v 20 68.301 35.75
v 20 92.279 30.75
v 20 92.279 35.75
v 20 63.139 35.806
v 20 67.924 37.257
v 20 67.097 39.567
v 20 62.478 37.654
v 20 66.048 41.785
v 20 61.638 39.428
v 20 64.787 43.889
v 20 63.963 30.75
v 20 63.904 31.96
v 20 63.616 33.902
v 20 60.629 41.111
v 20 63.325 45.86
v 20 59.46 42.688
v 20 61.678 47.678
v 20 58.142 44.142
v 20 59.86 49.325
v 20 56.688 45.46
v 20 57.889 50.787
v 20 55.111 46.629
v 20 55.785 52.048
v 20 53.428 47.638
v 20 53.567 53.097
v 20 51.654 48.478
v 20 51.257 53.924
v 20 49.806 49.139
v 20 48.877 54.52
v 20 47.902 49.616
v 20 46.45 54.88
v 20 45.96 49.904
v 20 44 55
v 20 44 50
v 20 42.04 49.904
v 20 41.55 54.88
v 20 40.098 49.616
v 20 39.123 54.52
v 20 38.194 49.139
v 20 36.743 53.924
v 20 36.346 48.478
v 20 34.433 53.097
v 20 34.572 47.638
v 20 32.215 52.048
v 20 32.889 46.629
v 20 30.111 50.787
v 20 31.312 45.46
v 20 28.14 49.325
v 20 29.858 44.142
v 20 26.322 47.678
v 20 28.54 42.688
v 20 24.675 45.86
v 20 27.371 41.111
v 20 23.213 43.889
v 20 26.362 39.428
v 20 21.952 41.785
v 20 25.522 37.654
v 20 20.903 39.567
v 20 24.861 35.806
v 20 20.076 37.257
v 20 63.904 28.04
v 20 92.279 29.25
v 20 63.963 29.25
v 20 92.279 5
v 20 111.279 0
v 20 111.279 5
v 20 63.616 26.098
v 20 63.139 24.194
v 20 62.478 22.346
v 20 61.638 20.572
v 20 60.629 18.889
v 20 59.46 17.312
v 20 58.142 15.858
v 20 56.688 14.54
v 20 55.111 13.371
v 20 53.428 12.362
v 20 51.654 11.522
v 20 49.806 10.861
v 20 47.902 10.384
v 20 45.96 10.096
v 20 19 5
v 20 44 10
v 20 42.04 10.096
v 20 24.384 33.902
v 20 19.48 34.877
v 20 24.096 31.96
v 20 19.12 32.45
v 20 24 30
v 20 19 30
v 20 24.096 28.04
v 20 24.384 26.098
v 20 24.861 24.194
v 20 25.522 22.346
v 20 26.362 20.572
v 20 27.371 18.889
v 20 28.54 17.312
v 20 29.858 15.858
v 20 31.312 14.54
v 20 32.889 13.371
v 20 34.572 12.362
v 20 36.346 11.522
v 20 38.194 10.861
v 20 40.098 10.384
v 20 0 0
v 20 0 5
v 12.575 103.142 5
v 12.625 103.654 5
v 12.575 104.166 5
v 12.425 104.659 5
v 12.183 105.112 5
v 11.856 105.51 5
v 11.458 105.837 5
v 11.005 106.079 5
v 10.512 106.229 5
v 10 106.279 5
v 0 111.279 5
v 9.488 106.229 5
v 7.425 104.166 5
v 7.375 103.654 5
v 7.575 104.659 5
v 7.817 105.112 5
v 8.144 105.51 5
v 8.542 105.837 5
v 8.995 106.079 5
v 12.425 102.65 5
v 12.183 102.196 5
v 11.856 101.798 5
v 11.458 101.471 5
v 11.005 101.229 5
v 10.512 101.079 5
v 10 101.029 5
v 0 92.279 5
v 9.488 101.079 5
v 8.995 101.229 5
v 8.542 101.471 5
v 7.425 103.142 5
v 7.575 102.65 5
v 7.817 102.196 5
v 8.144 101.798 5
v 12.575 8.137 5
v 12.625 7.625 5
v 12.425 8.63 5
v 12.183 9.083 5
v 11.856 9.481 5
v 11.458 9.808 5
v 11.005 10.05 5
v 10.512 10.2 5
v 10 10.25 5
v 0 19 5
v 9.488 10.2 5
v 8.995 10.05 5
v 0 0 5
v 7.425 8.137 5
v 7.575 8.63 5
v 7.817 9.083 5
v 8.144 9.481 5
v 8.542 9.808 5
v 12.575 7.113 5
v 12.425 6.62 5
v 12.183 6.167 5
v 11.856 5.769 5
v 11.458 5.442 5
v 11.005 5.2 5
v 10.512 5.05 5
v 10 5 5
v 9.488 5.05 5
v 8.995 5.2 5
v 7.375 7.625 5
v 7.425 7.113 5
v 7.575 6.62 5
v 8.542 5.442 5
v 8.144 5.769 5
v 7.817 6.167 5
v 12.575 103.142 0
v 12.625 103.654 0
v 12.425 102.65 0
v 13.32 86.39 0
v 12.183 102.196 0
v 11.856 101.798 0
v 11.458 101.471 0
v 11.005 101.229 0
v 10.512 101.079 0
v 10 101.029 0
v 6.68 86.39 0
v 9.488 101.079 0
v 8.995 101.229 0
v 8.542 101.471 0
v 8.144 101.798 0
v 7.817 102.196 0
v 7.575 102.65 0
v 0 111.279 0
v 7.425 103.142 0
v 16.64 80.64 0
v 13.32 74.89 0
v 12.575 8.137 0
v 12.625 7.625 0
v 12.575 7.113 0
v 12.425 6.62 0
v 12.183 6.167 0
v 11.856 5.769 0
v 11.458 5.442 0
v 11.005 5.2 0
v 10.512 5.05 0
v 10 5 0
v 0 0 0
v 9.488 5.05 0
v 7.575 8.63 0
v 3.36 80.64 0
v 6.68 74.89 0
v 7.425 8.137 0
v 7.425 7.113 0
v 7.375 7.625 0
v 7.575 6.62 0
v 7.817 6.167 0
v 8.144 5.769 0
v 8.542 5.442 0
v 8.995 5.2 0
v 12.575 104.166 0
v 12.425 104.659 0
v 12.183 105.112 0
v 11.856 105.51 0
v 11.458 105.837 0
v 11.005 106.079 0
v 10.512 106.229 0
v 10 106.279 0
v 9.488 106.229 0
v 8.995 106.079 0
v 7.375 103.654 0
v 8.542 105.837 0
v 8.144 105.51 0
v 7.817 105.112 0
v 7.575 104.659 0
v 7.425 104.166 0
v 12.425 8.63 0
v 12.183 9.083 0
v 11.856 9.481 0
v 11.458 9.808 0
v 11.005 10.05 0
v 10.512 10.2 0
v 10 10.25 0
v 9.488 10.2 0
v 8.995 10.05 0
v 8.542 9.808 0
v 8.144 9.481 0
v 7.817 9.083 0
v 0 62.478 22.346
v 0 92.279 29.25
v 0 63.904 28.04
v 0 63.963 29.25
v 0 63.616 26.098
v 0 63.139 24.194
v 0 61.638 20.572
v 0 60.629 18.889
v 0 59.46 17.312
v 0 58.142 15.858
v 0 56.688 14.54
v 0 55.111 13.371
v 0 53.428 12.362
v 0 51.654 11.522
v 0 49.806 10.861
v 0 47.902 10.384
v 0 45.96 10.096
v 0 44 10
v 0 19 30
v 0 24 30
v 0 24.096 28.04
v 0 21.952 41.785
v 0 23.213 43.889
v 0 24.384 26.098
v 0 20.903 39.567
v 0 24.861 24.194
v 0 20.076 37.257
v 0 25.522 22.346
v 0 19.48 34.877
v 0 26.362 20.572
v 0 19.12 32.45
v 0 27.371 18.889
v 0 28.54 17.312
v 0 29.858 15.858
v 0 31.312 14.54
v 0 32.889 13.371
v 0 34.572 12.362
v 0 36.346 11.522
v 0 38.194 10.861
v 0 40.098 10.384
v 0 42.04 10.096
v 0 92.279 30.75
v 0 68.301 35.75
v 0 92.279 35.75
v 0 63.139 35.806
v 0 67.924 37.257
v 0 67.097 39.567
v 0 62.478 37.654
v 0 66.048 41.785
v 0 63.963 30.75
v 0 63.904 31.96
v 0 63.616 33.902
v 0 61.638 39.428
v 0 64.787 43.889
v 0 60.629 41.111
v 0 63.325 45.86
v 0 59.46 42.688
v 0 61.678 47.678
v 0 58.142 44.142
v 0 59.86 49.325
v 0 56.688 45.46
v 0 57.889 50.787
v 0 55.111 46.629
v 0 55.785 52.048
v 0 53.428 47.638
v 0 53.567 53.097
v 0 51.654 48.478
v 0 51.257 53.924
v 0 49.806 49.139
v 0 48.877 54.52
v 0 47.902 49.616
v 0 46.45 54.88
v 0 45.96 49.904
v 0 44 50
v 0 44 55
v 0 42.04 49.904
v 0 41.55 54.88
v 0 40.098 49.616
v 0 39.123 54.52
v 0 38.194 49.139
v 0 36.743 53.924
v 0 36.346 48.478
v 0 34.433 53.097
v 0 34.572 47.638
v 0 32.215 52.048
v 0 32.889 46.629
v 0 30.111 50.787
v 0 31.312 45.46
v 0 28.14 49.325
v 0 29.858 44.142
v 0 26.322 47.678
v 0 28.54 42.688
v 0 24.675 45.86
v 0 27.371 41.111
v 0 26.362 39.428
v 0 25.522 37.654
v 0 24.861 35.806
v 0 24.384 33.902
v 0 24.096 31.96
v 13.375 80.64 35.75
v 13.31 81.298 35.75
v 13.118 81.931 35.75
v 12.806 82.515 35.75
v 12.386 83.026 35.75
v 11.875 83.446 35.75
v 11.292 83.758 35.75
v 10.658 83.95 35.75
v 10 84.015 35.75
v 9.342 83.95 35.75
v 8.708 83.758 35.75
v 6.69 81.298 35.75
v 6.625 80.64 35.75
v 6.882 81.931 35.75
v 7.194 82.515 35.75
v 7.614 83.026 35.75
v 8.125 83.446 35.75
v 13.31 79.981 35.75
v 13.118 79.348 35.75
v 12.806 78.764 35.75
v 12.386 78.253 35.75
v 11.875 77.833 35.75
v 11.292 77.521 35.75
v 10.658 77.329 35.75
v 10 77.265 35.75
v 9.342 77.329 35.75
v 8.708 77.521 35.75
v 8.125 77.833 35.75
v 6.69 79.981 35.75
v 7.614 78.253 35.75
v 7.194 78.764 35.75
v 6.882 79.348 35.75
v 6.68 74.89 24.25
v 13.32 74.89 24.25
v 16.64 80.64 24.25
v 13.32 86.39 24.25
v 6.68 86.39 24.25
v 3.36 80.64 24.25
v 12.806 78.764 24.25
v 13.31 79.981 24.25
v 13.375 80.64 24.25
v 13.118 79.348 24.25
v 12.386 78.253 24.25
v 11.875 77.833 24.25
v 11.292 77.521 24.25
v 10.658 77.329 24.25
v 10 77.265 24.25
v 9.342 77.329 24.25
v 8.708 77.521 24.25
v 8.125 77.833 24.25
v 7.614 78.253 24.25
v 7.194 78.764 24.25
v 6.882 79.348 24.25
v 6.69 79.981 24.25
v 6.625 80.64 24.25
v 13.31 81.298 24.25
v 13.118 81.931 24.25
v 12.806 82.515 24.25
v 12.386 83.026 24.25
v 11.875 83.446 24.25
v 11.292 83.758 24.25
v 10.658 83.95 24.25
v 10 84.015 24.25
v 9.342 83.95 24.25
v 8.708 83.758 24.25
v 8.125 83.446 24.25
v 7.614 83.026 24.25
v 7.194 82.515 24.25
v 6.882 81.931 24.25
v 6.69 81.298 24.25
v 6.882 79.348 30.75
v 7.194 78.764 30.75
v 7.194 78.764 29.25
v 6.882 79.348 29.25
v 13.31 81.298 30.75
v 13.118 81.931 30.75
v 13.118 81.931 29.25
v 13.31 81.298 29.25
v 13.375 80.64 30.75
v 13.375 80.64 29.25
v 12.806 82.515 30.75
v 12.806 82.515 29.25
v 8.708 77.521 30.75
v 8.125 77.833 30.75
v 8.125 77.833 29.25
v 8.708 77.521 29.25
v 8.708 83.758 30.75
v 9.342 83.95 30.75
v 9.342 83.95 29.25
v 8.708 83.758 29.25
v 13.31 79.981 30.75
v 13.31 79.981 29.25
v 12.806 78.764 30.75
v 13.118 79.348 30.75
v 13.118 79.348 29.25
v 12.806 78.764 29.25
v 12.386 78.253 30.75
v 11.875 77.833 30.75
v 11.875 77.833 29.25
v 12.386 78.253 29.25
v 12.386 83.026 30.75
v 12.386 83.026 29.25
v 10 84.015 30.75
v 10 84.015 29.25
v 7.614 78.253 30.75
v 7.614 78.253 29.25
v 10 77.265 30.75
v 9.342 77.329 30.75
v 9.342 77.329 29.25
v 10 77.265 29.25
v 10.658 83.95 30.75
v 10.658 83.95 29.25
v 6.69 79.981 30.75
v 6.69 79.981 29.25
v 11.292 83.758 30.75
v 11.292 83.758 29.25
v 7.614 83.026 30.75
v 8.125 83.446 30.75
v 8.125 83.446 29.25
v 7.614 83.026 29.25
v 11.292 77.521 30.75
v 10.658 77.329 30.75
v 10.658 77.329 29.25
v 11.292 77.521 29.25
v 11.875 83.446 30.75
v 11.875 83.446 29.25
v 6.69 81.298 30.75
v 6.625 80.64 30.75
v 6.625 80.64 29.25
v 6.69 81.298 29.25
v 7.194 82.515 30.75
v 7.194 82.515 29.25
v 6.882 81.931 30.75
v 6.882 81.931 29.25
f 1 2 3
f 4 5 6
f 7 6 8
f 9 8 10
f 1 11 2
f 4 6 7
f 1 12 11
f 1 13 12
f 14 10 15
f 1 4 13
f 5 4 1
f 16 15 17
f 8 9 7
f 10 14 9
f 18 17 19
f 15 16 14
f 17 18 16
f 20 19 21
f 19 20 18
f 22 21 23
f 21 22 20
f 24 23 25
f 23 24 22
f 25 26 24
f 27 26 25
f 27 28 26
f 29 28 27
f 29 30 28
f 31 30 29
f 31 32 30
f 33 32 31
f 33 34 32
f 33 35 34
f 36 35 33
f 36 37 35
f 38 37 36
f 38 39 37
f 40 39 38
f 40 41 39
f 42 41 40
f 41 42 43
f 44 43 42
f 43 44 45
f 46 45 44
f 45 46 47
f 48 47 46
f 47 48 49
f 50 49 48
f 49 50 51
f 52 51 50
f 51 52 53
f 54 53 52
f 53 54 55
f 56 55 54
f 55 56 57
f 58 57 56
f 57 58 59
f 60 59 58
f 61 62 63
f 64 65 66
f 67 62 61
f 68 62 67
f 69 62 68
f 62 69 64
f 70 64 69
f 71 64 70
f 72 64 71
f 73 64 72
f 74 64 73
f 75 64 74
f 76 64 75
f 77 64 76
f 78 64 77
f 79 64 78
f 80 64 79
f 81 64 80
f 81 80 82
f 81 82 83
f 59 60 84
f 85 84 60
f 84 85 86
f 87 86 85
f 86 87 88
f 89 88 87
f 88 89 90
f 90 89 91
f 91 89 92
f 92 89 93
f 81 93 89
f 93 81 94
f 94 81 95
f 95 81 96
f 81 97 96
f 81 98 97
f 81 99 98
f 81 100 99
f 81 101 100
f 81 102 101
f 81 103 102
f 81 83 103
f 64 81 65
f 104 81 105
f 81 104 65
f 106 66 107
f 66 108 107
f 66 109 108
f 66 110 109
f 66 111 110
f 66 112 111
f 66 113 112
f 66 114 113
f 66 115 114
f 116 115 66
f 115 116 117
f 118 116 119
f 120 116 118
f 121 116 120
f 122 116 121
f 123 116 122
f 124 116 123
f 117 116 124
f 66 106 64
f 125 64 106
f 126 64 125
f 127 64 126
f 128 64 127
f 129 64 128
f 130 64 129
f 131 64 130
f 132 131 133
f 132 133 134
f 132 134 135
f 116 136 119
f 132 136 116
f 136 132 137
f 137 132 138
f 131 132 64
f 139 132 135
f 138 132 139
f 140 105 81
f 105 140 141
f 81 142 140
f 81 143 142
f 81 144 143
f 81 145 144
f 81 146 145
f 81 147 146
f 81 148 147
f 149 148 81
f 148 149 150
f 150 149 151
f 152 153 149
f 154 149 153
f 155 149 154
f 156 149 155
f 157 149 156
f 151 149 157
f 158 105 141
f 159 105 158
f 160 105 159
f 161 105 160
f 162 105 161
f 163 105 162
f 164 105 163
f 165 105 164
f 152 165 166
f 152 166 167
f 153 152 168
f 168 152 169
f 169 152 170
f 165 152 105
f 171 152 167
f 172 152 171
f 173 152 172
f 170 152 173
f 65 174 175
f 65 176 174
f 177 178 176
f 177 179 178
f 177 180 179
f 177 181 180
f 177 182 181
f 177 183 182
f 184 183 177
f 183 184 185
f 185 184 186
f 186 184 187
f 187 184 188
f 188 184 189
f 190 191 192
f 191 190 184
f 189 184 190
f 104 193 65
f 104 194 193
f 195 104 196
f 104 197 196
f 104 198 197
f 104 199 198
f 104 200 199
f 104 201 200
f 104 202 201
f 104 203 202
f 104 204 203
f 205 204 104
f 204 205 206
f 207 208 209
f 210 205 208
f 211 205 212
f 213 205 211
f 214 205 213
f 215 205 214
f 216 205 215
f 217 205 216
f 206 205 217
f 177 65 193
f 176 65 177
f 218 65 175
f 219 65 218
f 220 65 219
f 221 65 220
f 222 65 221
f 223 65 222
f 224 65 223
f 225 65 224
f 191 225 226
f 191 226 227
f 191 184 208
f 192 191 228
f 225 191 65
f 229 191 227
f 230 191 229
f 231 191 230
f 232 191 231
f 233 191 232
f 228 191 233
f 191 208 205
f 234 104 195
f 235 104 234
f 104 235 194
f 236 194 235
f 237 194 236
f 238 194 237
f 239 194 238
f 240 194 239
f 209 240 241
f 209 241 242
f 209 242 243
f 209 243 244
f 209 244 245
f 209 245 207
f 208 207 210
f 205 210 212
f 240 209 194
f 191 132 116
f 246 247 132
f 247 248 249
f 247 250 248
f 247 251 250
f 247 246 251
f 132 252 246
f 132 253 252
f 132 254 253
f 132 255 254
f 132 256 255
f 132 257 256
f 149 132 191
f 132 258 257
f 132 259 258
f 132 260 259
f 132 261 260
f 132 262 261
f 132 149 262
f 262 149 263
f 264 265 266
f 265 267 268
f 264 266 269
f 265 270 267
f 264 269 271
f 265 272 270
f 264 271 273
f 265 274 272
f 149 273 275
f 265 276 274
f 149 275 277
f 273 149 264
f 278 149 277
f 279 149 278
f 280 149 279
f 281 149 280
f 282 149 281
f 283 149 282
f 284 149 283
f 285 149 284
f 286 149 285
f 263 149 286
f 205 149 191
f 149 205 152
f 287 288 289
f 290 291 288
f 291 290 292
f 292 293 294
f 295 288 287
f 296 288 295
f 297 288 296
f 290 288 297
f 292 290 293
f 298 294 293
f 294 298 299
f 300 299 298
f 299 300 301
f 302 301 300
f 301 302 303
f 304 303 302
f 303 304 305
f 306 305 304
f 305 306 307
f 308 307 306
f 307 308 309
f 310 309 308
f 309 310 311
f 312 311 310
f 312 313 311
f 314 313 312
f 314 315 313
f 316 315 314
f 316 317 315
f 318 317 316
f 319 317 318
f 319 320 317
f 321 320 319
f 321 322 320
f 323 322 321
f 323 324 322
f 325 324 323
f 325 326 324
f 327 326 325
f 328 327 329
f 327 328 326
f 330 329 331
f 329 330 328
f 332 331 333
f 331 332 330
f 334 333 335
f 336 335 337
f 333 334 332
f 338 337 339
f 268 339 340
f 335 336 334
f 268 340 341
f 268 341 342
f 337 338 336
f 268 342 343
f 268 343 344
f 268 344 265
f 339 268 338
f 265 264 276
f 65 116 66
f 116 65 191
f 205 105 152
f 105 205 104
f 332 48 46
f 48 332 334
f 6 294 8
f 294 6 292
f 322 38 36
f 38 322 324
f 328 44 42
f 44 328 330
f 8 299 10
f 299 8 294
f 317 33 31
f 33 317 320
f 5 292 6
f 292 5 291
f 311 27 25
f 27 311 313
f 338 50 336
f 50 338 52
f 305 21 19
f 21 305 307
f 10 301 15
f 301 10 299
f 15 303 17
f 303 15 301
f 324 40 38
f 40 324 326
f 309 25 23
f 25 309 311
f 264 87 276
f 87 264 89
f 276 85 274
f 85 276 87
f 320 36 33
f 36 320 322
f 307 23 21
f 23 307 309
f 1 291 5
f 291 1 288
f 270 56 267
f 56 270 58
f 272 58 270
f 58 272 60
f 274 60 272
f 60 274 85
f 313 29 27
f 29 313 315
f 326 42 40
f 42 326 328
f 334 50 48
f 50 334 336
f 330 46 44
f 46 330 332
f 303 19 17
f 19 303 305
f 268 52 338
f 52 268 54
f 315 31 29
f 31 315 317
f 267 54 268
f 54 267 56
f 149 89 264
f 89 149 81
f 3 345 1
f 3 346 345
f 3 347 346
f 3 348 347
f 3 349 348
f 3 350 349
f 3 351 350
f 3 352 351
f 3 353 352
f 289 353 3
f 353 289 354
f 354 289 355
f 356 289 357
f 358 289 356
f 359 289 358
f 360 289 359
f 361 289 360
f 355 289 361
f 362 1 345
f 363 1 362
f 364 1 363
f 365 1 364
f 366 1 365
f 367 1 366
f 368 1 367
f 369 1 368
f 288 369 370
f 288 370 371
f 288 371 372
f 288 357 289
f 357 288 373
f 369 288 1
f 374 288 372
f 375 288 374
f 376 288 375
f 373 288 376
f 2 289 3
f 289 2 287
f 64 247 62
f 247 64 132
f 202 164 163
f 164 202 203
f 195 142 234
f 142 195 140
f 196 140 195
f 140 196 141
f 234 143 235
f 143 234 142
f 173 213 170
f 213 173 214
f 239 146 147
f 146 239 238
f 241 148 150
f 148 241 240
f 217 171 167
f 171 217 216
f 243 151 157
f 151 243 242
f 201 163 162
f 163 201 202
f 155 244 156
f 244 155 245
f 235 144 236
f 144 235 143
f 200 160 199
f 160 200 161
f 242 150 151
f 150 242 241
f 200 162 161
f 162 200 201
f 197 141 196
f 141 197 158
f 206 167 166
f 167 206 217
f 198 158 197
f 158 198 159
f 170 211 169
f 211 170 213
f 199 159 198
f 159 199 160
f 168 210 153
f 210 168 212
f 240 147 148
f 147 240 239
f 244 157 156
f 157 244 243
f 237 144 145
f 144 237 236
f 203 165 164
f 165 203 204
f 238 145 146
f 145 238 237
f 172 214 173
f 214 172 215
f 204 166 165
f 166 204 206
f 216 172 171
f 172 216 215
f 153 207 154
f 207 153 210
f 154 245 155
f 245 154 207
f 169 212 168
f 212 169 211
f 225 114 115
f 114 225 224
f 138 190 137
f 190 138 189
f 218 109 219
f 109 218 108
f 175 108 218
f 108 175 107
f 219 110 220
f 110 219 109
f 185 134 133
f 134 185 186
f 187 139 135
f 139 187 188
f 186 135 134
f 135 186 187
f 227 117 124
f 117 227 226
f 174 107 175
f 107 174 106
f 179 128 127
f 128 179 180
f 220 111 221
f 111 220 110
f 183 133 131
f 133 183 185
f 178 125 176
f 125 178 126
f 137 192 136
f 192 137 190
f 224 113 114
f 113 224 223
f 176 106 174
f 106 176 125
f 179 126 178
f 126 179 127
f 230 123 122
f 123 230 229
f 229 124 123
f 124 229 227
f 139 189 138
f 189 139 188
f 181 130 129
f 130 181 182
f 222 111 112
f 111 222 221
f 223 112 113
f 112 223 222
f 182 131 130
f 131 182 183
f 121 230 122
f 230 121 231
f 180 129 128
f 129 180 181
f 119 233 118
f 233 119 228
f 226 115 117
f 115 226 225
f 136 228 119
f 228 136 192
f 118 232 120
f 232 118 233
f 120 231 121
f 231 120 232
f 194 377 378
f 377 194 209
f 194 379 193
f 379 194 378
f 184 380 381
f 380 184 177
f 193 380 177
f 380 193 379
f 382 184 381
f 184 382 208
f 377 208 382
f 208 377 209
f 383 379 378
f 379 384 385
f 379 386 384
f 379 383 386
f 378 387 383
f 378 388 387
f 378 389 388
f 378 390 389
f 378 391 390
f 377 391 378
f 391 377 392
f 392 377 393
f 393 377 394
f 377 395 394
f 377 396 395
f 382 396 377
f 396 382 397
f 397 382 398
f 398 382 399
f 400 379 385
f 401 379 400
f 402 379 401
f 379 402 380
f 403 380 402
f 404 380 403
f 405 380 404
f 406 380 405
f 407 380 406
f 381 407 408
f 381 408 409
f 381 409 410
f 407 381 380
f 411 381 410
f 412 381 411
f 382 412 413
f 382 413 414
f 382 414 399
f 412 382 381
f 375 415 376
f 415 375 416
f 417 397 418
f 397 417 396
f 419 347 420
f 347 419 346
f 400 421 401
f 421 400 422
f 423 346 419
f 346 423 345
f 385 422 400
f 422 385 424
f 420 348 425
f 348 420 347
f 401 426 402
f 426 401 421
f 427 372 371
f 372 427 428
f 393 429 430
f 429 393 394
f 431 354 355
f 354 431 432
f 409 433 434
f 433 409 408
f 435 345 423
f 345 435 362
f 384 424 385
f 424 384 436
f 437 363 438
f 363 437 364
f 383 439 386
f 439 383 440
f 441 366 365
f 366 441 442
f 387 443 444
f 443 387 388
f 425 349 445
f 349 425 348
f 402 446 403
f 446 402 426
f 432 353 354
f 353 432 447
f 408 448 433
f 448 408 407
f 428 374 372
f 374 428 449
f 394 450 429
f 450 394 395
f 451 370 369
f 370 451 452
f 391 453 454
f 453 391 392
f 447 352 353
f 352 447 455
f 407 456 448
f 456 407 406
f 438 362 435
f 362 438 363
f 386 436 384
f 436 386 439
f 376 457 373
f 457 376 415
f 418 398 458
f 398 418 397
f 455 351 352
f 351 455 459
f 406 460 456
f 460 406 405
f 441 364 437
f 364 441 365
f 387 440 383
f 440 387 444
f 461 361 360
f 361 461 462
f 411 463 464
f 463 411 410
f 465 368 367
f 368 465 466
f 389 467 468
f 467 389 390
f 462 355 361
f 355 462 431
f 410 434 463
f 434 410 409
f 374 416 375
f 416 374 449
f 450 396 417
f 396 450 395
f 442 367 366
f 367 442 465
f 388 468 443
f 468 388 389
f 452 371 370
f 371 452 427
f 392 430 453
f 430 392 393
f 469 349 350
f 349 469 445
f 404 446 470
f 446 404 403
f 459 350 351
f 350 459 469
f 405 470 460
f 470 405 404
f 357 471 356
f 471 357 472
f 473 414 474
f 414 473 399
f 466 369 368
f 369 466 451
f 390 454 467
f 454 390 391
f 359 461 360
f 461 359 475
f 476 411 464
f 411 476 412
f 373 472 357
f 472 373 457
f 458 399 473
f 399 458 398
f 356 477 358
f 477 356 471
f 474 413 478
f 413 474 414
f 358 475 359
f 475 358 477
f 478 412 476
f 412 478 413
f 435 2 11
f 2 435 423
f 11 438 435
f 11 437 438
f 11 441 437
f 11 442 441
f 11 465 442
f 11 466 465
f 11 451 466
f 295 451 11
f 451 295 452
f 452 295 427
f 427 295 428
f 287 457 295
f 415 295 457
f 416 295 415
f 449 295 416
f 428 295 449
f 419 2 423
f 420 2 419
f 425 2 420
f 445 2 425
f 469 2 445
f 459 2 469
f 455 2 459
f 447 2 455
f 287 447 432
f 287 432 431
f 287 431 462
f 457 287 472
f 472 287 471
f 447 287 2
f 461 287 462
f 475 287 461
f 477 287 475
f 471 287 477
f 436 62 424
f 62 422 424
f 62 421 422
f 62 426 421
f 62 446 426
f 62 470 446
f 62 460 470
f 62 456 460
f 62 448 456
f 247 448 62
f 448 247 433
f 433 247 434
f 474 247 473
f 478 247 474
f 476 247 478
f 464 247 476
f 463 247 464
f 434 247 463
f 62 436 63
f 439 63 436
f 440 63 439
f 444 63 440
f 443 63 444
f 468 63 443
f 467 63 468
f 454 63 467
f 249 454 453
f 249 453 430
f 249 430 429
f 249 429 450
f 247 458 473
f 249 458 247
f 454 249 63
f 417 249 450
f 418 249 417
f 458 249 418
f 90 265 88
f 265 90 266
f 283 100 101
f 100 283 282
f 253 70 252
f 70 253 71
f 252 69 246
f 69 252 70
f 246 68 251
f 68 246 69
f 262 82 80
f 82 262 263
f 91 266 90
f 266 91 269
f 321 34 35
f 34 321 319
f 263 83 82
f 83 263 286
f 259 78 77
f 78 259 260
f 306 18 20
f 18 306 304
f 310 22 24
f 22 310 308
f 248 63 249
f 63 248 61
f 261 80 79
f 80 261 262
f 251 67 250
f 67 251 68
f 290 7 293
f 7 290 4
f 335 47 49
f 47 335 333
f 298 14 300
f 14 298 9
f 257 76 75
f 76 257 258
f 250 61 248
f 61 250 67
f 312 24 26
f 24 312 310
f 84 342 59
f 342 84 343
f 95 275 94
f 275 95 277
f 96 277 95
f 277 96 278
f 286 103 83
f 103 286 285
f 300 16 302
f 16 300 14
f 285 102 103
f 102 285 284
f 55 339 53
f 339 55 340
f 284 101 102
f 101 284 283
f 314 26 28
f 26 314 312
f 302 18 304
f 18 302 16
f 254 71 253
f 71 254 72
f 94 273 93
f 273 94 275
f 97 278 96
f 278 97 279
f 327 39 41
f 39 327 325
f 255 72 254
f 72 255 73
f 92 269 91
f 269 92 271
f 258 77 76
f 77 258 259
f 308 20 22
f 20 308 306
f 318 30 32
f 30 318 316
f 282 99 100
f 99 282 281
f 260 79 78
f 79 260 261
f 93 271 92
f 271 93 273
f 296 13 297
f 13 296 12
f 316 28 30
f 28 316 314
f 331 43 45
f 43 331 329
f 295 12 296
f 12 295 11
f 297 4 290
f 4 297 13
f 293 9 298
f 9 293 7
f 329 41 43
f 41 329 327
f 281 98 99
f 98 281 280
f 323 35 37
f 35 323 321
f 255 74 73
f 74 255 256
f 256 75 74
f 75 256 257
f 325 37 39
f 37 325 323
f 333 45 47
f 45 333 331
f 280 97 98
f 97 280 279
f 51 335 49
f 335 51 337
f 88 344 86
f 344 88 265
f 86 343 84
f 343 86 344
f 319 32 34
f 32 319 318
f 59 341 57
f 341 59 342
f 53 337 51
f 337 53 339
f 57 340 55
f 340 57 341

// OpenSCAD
min_T = 5;

motor_D = 40;
motor_offset = 30;

gap_T = 1.5;

bolt1_D = 5.25;
bolt1_HD = 9;

bolt2_D = 6.75;
bolt2_HW = 11.5;
bolt2_HD = 2*bolt2_HW/sqrt(3);

mount_T = 20;
mount_L = 2*bolt1_HD + bolt2_HD + 8*min_T + motor_D;

difference(){
union(){
  cube([mount_T, mount_L, min_T]);

  translate([0, motor_D/2 +min_T + bolt1_HD + 2*min_T, motor_offset])
  rotate([0, 90, 0])
  cylinder(d = motor_D + 2*min_T, h = mount_T, $fn = 64);

  translate([0, bolt1_HD + 2*min_T, 0])
  cube([mount_T, motor_D/2 + min_T, motor_offset]);

  translate([0, motor_D/2 + 3*min_T + bolt1_HD, 0])
  cube([mount_T, motor_D/2 + 3*min_T + bolt2_HD, motor_offset + gap_T/2 + min_T]);
}

translate([mount_T/2, min_T + bolt1_D/2, -0.1])
cylinder(d = bolt1_D, h = min_T + 0.2, $fn = 32);

translate([mount_T/2, mount_L - min_T - bolt1_D/2, -0.1])
cylinder(d = bolt1_D, h = min_T + 0.2, $fn = 32);

translate([mount_T/2, mount_L - 3*min_T - bolt1_HD - bolt2_HD/2, -0.1])
cylinder(d = bolt2_HD, h = motor_offset - gap_T/2 - min_T + 0.1, $fn = 6);

translate([mount_T/2, mount_L - 3*min_T - bolt1_HD - bolt2_HD/2, 0])
cylinder(d = bolt2_D, h = motor_offset + gap_T/2 + min_T + 0.1, $fn = 32);

translate([-0.1, motor_D/2 + bolt1_HD + 3*min_T, motor_offset - gap_T/2])
cube([mount_T + 0.2, motor_D/2 + 3*min_T + bolt2_HD + 0.1, gap_T]);

translate([-0.1, motor_D/2 + bolt1_HD + 3*min_T, motor_offset])
rotate([0, 90, 0])
cylinder(d = motor_D, h = mount_T + 0.2, $fn = 64);
}
